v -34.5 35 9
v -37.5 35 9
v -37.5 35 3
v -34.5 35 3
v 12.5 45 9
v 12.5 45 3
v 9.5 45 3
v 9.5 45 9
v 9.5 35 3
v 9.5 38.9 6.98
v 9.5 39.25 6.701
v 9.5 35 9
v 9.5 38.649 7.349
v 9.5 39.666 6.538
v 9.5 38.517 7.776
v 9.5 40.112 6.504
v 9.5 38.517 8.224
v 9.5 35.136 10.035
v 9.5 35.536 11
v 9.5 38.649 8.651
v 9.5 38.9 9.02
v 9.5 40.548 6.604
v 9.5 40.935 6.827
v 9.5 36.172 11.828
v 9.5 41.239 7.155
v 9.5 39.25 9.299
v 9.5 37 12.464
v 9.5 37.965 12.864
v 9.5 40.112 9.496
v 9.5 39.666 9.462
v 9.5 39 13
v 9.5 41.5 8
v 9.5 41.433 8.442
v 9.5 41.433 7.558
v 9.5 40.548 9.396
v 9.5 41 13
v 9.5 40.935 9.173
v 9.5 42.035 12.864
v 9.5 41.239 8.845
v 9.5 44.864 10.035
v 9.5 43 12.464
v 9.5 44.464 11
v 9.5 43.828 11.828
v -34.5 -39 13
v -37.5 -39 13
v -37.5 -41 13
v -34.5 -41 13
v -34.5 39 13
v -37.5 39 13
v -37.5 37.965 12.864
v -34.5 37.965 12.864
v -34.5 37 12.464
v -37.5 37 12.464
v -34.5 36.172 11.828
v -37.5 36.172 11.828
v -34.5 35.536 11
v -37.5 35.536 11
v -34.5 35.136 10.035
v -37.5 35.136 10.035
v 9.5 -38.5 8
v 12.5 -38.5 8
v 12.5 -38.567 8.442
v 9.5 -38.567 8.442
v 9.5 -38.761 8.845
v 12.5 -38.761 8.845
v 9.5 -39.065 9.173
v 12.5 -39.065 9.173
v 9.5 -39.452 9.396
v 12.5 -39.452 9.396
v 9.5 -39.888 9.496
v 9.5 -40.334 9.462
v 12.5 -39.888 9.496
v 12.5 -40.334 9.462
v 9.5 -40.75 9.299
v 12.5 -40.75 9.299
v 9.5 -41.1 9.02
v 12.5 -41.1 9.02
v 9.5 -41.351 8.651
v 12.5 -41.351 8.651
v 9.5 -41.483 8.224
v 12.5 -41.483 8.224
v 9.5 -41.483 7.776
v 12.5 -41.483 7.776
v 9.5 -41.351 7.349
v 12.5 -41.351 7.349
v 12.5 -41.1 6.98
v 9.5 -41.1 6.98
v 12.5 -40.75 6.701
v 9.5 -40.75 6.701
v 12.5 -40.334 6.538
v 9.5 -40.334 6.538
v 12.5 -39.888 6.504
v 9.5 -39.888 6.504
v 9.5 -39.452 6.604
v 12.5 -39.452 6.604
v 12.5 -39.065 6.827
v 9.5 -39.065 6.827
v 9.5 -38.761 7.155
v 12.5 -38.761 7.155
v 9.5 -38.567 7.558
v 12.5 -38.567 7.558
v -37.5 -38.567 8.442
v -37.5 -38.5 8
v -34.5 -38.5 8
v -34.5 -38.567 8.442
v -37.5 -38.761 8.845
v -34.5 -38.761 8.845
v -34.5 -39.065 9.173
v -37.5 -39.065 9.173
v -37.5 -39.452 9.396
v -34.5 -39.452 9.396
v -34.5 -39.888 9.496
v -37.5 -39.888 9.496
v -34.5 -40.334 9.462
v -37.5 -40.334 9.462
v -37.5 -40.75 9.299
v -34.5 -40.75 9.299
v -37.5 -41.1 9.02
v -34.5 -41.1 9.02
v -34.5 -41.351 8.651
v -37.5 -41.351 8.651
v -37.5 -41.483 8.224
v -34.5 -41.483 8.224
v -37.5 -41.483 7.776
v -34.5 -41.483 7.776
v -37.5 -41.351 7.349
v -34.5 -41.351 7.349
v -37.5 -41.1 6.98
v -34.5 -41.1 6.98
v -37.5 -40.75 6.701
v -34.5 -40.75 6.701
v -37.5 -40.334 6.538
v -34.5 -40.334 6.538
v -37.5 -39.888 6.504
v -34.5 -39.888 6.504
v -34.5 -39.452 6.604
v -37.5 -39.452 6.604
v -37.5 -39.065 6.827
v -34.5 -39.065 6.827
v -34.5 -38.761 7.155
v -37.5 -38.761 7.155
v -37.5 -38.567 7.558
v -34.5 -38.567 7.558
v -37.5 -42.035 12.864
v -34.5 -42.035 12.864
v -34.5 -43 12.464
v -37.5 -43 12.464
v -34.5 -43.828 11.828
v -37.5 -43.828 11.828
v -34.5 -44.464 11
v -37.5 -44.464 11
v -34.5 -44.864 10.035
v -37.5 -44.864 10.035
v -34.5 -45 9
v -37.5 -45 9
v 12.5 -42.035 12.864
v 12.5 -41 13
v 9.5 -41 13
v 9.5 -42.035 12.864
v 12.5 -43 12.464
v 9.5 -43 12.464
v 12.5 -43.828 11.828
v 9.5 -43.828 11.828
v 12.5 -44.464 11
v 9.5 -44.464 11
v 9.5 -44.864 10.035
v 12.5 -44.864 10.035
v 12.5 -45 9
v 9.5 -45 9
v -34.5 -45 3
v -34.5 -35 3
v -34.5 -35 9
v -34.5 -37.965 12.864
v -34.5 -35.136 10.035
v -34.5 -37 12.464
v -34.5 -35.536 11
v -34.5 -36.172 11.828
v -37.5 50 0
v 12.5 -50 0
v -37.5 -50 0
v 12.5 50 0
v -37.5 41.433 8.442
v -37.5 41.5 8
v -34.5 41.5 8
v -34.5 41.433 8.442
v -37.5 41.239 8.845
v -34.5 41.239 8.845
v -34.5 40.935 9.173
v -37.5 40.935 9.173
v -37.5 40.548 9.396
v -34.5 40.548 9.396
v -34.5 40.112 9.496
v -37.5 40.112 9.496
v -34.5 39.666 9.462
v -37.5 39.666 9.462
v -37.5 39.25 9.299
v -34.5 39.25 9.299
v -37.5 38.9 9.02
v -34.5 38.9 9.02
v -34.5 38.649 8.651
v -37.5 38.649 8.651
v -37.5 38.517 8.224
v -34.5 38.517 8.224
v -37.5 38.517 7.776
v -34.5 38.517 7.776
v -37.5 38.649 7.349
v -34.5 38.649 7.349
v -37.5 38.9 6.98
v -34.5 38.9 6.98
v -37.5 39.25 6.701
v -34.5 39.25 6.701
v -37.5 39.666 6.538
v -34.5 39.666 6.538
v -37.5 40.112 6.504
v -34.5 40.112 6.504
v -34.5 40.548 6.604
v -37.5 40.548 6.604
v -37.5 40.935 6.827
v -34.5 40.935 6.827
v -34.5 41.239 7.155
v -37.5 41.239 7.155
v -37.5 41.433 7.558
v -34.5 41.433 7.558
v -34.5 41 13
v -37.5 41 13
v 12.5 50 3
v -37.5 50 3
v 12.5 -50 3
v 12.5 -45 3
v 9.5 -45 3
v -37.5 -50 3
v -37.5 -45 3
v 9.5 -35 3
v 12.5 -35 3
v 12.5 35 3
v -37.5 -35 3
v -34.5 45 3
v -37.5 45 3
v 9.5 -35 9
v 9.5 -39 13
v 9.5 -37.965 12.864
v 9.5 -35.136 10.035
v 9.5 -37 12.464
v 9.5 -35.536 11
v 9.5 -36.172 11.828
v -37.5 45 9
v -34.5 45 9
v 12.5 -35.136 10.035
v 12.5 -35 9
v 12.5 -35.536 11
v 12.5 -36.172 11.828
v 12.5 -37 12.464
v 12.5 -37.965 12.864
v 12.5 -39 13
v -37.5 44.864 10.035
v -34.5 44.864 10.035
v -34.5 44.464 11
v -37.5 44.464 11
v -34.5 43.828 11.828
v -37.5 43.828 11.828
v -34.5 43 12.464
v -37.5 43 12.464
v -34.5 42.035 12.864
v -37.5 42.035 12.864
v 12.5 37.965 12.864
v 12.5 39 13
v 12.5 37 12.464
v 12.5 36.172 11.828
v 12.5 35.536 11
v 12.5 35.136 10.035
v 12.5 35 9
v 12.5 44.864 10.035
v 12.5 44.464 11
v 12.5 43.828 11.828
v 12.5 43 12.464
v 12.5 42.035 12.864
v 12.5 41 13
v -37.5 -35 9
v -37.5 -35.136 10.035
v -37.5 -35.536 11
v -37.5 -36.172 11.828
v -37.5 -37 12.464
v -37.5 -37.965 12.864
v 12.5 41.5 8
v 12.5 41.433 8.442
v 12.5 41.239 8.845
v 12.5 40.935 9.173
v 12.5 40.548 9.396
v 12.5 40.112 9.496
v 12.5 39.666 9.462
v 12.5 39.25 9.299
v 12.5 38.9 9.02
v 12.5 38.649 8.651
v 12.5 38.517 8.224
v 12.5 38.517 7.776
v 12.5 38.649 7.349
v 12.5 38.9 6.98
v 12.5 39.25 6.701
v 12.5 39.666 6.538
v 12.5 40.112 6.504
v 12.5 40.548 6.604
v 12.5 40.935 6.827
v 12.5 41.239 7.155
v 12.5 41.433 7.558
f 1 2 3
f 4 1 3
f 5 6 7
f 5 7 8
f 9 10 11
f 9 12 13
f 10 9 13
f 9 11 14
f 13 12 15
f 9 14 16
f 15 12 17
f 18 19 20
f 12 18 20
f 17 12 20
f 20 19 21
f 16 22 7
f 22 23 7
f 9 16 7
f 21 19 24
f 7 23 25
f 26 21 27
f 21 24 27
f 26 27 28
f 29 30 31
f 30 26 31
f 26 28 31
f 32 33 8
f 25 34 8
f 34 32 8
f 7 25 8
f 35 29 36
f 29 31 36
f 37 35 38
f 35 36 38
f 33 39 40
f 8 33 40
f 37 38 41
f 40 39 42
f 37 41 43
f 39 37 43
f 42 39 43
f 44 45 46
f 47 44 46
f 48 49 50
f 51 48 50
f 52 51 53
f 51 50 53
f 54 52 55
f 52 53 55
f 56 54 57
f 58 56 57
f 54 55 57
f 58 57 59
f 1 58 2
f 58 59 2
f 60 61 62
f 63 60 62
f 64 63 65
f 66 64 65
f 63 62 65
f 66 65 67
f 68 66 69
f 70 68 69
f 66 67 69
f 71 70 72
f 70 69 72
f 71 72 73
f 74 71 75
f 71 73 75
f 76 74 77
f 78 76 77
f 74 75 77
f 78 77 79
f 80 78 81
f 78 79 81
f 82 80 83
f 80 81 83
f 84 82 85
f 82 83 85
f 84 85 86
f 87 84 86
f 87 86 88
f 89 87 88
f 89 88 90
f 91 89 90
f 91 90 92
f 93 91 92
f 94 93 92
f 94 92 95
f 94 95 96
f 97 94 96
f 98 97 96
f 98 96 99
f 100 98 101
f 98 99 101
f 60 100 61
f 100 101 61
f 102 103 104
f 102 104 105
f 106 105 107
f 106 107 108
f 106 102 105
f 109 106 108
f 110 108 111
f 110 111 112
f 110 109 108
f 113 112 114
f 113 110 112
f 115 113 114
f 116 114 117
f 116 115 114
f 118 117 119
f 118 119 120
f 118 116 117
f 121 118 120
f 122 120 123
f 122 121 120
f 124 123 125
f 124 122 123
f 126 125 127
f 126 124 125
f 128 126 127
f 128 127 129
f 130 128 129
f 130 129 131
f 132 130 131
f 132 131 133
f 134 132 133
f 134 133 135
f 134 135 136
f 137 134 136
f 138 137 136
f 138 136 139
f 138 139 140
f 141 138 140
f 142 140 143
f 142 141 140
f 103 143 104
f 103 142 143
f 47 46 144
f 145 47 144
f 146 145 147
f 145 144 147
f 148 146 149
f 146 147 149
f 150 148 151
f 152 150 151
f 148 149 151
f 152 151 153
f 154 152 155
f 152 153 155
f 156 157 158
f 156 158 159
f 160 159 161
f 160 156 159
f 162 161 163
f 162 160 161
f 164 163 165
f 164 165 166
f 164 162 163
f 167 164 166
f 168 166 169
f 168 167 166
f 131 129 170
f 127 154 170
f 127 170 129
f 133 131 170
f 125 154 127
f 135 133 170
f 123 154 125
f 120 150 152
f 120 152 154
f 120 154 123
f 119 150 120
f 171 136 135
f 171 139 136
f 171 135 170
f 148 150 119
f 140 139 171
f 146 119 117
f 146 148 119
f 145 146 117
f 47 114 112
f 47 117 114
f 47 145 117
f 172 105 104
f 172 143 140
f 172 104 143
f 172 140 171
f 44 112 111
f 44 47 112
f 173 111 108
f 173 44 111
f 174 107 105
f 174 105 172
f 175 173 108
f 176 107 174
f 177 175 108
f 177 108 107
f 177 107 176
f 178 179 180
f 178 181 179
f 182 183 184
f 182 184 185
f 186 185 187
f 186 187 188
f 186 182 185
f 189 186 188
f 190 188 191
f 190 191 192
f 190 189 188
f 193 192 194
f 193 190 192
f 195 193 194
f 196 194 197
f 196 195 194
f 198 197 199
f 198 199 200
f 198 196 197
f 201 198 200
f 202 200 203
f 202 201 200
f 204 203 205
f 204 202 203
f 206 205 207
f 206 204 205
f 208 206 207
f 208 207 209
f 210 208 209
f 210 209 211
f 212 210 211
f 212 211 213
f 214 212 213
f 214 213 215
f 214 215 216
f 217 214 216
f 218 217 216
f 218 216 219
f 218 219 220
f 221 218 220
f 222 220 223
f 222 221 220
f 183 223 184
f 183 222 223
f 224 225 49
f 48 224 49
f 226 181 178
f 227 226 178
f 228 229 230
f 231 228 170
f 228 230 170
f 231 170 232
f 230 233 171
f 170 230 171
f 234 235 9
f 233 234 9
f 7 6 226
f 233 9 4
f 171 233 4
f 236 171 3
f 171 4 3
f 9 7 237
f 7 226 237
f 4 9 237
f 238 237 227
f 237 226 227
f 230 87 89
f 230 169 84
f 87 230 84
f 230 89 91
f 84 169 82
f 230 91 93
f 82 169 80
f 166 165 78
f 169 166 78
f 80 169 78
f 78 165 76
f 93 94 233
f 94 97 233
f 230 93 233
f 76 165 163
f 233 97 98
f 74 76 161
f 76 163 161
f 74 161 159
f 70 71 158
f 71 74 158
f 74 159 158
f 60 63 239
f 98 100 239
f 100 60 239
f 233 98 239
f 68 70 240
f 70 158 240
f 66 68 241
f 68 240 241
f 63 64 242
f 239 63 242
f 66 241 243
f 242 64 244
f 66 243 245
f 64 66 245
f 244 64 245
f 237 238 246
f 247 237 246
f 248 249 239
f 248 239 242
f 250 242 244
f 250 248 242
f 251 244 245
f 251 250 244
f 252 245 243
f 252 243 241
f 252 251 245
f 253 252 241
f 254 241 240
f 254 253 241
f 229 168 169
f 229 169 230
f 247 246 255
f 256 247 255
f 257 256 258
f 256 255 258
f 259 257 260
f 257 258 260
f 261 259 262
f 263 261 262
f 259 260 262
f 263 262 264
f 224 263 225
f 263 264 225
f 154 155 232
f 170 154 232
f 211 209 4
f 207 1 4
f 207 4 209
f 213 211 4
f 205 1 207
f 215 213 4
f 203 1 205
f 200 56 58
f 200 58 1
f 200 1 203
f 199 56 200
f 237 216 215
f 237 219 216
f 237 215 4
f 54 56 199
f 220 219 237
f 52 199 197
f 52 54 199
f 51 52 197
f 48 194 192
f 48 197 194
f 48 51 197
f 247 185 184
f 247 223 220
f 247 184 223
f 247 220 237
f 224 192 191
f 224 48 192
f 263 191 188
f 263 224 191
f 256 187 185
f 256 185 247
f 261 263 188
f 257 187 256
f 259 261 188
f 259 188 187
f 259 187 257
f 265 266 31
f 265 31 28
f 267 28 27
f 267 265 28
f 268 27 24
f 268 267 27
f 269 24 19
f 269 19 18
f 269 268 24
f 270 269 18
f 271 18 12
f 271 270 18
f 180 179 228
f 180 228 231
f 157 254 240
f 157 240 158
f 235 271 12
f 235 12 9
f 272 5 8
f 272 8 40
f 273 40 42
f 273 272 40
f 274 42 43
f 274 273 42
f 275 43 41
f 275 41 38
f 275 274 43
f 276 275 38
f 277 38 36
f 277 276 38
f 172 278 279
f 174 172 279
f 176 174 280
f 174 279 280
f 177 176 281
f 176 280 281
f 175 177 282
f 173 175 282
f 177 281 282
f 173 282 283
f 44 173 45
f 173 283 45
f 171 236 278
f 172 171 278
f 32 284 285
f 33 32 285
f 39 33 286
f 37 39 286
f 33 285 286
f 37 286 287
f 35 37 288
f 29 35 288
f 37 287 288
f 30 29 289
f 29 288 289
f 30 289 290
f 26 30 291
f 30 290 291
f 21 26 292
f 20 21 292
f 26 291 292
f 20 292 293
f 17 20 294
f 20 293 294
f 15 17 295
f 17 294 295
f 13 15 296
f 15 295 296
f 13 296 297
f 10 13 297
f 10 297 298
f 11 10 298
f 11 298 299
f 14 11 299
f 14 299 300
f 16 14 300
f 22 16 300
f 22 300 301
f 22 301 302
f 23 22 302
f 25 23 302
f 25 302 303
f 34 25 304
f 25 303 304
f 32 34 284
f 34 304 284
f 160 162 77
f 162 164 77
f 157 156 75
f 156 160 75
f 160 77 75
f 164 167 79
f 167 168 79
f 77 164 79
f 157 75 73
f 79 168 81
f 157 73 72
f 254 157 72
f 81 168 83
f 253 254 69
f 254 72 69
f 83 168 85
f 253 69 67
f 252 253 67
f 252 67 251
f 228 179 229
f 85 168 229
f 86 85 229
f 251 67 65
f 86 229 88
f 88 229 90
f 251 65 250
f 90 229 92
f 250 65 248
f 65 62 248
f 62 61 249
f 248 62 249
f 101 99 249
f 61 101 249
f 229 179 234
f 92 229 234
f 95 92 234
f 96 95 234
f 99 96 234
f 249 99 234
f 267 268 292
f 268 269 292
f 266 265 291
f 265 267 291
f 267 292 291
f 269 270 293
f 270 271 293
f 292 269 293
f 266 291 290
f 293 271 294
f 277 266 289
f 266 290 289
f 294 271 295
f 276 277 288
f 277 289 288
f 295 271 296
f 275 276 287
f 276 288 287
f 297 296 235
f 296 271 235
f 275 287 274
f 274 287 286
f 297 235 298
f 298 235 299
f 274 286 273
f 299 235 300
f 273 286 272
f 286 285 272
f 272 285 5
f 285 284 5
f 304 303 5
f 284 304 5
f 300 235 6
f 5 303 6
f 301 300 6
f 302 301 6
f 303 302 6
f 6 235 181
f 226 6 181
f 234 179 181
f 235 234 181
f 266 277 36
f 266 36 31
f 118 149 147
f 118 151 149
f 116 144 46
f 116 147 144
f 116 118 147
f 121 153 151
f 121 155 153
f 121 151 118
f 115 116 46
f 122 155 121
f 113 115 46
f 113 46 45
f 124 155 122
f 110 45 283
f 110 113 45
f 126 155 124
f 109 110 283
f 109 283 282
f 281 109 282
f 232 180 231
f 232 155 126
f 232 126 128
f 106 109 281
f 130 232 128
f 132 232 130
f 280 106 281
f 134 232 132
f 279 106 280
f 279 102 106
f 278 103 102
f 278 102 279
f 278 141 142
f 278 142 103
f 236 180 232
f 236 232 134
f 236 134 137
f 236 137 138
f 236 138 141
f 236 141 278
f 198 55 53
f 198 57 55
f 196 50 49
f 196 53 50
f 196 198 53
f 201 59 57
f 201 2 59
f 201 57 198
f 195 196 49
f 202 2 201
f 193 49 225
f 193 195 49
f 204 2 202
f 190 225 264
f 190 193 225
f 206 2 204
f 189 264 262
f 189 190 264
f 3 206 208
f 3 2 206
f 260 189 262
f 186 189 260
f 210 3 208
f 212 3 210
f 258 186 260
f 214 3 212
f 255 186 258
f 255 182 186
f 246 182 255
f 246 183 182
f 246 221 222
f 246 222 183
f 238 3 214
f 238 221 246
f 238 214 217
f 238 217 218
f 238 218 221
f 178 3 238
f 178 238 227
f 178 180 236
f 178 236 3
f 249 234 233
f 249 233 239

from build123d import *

# Parameters (mm, degrees)
F0_W     = 25
F0_H     = 100
F1_DEPTH = 3
F2_R     = 1.5
F3_DEPTH = 3


with BuildPart() as f1:
    # F0 (on Top) → F1 (new body)
    with BuildSketch(Plane.XY):
        Rectangle(F0_W, F0_H)
    extrude(amount=F1_DEPTH)

    # F2 (on face) → F3 (join)
    with BuildSketch(Plane.YZ.offset(12.5)):
        with BuildLine():
            Line((35, 9), (35, 3))
            Line((35, 3), (45, 3))
            Line((45, 3), (45, 9))
            ThreePointArc((45, 9), (43.828427, 11.828427), (41, 13))
            Line((41, 13), (39, 13))
            ThreePointArc((39, 13), (36.171573, 11.828427), (35, 9))
        make_face()
        with Locations((40, 8)):
            Circle(F2_R, mode=Mode.SUBTRACT)
        with BuildLine():
            Line((-45, 9), (-45, 3))
            Line((-45, 3), (-35, 3))
            Line((-35, 3), (-35, 9))
            ThreePointArc((-35, 9), (-36.171573, 11.828427), (-39, 13))
            Line((-39, 13), (-41, 13))
            ThreePointArc((-41, 13), (-43.828427, 11.828427), (-45, 9))
        make_face()
        with Locations((-40, 8)):
            Circle(F2_R, mode=Mode.SUBTRACT)
    extrude(amount=-F3_DEPTH)

    # F4: F1 across face


with BuildPart() as f1_1:
    add(f1.part)
    add(f1.part.mirror(Plane(origin=(-12.5, 0, 1.5), x_dir=(0, -1, 0), z_dir=(-1, 0, 0))))


solid = f1_1.part
